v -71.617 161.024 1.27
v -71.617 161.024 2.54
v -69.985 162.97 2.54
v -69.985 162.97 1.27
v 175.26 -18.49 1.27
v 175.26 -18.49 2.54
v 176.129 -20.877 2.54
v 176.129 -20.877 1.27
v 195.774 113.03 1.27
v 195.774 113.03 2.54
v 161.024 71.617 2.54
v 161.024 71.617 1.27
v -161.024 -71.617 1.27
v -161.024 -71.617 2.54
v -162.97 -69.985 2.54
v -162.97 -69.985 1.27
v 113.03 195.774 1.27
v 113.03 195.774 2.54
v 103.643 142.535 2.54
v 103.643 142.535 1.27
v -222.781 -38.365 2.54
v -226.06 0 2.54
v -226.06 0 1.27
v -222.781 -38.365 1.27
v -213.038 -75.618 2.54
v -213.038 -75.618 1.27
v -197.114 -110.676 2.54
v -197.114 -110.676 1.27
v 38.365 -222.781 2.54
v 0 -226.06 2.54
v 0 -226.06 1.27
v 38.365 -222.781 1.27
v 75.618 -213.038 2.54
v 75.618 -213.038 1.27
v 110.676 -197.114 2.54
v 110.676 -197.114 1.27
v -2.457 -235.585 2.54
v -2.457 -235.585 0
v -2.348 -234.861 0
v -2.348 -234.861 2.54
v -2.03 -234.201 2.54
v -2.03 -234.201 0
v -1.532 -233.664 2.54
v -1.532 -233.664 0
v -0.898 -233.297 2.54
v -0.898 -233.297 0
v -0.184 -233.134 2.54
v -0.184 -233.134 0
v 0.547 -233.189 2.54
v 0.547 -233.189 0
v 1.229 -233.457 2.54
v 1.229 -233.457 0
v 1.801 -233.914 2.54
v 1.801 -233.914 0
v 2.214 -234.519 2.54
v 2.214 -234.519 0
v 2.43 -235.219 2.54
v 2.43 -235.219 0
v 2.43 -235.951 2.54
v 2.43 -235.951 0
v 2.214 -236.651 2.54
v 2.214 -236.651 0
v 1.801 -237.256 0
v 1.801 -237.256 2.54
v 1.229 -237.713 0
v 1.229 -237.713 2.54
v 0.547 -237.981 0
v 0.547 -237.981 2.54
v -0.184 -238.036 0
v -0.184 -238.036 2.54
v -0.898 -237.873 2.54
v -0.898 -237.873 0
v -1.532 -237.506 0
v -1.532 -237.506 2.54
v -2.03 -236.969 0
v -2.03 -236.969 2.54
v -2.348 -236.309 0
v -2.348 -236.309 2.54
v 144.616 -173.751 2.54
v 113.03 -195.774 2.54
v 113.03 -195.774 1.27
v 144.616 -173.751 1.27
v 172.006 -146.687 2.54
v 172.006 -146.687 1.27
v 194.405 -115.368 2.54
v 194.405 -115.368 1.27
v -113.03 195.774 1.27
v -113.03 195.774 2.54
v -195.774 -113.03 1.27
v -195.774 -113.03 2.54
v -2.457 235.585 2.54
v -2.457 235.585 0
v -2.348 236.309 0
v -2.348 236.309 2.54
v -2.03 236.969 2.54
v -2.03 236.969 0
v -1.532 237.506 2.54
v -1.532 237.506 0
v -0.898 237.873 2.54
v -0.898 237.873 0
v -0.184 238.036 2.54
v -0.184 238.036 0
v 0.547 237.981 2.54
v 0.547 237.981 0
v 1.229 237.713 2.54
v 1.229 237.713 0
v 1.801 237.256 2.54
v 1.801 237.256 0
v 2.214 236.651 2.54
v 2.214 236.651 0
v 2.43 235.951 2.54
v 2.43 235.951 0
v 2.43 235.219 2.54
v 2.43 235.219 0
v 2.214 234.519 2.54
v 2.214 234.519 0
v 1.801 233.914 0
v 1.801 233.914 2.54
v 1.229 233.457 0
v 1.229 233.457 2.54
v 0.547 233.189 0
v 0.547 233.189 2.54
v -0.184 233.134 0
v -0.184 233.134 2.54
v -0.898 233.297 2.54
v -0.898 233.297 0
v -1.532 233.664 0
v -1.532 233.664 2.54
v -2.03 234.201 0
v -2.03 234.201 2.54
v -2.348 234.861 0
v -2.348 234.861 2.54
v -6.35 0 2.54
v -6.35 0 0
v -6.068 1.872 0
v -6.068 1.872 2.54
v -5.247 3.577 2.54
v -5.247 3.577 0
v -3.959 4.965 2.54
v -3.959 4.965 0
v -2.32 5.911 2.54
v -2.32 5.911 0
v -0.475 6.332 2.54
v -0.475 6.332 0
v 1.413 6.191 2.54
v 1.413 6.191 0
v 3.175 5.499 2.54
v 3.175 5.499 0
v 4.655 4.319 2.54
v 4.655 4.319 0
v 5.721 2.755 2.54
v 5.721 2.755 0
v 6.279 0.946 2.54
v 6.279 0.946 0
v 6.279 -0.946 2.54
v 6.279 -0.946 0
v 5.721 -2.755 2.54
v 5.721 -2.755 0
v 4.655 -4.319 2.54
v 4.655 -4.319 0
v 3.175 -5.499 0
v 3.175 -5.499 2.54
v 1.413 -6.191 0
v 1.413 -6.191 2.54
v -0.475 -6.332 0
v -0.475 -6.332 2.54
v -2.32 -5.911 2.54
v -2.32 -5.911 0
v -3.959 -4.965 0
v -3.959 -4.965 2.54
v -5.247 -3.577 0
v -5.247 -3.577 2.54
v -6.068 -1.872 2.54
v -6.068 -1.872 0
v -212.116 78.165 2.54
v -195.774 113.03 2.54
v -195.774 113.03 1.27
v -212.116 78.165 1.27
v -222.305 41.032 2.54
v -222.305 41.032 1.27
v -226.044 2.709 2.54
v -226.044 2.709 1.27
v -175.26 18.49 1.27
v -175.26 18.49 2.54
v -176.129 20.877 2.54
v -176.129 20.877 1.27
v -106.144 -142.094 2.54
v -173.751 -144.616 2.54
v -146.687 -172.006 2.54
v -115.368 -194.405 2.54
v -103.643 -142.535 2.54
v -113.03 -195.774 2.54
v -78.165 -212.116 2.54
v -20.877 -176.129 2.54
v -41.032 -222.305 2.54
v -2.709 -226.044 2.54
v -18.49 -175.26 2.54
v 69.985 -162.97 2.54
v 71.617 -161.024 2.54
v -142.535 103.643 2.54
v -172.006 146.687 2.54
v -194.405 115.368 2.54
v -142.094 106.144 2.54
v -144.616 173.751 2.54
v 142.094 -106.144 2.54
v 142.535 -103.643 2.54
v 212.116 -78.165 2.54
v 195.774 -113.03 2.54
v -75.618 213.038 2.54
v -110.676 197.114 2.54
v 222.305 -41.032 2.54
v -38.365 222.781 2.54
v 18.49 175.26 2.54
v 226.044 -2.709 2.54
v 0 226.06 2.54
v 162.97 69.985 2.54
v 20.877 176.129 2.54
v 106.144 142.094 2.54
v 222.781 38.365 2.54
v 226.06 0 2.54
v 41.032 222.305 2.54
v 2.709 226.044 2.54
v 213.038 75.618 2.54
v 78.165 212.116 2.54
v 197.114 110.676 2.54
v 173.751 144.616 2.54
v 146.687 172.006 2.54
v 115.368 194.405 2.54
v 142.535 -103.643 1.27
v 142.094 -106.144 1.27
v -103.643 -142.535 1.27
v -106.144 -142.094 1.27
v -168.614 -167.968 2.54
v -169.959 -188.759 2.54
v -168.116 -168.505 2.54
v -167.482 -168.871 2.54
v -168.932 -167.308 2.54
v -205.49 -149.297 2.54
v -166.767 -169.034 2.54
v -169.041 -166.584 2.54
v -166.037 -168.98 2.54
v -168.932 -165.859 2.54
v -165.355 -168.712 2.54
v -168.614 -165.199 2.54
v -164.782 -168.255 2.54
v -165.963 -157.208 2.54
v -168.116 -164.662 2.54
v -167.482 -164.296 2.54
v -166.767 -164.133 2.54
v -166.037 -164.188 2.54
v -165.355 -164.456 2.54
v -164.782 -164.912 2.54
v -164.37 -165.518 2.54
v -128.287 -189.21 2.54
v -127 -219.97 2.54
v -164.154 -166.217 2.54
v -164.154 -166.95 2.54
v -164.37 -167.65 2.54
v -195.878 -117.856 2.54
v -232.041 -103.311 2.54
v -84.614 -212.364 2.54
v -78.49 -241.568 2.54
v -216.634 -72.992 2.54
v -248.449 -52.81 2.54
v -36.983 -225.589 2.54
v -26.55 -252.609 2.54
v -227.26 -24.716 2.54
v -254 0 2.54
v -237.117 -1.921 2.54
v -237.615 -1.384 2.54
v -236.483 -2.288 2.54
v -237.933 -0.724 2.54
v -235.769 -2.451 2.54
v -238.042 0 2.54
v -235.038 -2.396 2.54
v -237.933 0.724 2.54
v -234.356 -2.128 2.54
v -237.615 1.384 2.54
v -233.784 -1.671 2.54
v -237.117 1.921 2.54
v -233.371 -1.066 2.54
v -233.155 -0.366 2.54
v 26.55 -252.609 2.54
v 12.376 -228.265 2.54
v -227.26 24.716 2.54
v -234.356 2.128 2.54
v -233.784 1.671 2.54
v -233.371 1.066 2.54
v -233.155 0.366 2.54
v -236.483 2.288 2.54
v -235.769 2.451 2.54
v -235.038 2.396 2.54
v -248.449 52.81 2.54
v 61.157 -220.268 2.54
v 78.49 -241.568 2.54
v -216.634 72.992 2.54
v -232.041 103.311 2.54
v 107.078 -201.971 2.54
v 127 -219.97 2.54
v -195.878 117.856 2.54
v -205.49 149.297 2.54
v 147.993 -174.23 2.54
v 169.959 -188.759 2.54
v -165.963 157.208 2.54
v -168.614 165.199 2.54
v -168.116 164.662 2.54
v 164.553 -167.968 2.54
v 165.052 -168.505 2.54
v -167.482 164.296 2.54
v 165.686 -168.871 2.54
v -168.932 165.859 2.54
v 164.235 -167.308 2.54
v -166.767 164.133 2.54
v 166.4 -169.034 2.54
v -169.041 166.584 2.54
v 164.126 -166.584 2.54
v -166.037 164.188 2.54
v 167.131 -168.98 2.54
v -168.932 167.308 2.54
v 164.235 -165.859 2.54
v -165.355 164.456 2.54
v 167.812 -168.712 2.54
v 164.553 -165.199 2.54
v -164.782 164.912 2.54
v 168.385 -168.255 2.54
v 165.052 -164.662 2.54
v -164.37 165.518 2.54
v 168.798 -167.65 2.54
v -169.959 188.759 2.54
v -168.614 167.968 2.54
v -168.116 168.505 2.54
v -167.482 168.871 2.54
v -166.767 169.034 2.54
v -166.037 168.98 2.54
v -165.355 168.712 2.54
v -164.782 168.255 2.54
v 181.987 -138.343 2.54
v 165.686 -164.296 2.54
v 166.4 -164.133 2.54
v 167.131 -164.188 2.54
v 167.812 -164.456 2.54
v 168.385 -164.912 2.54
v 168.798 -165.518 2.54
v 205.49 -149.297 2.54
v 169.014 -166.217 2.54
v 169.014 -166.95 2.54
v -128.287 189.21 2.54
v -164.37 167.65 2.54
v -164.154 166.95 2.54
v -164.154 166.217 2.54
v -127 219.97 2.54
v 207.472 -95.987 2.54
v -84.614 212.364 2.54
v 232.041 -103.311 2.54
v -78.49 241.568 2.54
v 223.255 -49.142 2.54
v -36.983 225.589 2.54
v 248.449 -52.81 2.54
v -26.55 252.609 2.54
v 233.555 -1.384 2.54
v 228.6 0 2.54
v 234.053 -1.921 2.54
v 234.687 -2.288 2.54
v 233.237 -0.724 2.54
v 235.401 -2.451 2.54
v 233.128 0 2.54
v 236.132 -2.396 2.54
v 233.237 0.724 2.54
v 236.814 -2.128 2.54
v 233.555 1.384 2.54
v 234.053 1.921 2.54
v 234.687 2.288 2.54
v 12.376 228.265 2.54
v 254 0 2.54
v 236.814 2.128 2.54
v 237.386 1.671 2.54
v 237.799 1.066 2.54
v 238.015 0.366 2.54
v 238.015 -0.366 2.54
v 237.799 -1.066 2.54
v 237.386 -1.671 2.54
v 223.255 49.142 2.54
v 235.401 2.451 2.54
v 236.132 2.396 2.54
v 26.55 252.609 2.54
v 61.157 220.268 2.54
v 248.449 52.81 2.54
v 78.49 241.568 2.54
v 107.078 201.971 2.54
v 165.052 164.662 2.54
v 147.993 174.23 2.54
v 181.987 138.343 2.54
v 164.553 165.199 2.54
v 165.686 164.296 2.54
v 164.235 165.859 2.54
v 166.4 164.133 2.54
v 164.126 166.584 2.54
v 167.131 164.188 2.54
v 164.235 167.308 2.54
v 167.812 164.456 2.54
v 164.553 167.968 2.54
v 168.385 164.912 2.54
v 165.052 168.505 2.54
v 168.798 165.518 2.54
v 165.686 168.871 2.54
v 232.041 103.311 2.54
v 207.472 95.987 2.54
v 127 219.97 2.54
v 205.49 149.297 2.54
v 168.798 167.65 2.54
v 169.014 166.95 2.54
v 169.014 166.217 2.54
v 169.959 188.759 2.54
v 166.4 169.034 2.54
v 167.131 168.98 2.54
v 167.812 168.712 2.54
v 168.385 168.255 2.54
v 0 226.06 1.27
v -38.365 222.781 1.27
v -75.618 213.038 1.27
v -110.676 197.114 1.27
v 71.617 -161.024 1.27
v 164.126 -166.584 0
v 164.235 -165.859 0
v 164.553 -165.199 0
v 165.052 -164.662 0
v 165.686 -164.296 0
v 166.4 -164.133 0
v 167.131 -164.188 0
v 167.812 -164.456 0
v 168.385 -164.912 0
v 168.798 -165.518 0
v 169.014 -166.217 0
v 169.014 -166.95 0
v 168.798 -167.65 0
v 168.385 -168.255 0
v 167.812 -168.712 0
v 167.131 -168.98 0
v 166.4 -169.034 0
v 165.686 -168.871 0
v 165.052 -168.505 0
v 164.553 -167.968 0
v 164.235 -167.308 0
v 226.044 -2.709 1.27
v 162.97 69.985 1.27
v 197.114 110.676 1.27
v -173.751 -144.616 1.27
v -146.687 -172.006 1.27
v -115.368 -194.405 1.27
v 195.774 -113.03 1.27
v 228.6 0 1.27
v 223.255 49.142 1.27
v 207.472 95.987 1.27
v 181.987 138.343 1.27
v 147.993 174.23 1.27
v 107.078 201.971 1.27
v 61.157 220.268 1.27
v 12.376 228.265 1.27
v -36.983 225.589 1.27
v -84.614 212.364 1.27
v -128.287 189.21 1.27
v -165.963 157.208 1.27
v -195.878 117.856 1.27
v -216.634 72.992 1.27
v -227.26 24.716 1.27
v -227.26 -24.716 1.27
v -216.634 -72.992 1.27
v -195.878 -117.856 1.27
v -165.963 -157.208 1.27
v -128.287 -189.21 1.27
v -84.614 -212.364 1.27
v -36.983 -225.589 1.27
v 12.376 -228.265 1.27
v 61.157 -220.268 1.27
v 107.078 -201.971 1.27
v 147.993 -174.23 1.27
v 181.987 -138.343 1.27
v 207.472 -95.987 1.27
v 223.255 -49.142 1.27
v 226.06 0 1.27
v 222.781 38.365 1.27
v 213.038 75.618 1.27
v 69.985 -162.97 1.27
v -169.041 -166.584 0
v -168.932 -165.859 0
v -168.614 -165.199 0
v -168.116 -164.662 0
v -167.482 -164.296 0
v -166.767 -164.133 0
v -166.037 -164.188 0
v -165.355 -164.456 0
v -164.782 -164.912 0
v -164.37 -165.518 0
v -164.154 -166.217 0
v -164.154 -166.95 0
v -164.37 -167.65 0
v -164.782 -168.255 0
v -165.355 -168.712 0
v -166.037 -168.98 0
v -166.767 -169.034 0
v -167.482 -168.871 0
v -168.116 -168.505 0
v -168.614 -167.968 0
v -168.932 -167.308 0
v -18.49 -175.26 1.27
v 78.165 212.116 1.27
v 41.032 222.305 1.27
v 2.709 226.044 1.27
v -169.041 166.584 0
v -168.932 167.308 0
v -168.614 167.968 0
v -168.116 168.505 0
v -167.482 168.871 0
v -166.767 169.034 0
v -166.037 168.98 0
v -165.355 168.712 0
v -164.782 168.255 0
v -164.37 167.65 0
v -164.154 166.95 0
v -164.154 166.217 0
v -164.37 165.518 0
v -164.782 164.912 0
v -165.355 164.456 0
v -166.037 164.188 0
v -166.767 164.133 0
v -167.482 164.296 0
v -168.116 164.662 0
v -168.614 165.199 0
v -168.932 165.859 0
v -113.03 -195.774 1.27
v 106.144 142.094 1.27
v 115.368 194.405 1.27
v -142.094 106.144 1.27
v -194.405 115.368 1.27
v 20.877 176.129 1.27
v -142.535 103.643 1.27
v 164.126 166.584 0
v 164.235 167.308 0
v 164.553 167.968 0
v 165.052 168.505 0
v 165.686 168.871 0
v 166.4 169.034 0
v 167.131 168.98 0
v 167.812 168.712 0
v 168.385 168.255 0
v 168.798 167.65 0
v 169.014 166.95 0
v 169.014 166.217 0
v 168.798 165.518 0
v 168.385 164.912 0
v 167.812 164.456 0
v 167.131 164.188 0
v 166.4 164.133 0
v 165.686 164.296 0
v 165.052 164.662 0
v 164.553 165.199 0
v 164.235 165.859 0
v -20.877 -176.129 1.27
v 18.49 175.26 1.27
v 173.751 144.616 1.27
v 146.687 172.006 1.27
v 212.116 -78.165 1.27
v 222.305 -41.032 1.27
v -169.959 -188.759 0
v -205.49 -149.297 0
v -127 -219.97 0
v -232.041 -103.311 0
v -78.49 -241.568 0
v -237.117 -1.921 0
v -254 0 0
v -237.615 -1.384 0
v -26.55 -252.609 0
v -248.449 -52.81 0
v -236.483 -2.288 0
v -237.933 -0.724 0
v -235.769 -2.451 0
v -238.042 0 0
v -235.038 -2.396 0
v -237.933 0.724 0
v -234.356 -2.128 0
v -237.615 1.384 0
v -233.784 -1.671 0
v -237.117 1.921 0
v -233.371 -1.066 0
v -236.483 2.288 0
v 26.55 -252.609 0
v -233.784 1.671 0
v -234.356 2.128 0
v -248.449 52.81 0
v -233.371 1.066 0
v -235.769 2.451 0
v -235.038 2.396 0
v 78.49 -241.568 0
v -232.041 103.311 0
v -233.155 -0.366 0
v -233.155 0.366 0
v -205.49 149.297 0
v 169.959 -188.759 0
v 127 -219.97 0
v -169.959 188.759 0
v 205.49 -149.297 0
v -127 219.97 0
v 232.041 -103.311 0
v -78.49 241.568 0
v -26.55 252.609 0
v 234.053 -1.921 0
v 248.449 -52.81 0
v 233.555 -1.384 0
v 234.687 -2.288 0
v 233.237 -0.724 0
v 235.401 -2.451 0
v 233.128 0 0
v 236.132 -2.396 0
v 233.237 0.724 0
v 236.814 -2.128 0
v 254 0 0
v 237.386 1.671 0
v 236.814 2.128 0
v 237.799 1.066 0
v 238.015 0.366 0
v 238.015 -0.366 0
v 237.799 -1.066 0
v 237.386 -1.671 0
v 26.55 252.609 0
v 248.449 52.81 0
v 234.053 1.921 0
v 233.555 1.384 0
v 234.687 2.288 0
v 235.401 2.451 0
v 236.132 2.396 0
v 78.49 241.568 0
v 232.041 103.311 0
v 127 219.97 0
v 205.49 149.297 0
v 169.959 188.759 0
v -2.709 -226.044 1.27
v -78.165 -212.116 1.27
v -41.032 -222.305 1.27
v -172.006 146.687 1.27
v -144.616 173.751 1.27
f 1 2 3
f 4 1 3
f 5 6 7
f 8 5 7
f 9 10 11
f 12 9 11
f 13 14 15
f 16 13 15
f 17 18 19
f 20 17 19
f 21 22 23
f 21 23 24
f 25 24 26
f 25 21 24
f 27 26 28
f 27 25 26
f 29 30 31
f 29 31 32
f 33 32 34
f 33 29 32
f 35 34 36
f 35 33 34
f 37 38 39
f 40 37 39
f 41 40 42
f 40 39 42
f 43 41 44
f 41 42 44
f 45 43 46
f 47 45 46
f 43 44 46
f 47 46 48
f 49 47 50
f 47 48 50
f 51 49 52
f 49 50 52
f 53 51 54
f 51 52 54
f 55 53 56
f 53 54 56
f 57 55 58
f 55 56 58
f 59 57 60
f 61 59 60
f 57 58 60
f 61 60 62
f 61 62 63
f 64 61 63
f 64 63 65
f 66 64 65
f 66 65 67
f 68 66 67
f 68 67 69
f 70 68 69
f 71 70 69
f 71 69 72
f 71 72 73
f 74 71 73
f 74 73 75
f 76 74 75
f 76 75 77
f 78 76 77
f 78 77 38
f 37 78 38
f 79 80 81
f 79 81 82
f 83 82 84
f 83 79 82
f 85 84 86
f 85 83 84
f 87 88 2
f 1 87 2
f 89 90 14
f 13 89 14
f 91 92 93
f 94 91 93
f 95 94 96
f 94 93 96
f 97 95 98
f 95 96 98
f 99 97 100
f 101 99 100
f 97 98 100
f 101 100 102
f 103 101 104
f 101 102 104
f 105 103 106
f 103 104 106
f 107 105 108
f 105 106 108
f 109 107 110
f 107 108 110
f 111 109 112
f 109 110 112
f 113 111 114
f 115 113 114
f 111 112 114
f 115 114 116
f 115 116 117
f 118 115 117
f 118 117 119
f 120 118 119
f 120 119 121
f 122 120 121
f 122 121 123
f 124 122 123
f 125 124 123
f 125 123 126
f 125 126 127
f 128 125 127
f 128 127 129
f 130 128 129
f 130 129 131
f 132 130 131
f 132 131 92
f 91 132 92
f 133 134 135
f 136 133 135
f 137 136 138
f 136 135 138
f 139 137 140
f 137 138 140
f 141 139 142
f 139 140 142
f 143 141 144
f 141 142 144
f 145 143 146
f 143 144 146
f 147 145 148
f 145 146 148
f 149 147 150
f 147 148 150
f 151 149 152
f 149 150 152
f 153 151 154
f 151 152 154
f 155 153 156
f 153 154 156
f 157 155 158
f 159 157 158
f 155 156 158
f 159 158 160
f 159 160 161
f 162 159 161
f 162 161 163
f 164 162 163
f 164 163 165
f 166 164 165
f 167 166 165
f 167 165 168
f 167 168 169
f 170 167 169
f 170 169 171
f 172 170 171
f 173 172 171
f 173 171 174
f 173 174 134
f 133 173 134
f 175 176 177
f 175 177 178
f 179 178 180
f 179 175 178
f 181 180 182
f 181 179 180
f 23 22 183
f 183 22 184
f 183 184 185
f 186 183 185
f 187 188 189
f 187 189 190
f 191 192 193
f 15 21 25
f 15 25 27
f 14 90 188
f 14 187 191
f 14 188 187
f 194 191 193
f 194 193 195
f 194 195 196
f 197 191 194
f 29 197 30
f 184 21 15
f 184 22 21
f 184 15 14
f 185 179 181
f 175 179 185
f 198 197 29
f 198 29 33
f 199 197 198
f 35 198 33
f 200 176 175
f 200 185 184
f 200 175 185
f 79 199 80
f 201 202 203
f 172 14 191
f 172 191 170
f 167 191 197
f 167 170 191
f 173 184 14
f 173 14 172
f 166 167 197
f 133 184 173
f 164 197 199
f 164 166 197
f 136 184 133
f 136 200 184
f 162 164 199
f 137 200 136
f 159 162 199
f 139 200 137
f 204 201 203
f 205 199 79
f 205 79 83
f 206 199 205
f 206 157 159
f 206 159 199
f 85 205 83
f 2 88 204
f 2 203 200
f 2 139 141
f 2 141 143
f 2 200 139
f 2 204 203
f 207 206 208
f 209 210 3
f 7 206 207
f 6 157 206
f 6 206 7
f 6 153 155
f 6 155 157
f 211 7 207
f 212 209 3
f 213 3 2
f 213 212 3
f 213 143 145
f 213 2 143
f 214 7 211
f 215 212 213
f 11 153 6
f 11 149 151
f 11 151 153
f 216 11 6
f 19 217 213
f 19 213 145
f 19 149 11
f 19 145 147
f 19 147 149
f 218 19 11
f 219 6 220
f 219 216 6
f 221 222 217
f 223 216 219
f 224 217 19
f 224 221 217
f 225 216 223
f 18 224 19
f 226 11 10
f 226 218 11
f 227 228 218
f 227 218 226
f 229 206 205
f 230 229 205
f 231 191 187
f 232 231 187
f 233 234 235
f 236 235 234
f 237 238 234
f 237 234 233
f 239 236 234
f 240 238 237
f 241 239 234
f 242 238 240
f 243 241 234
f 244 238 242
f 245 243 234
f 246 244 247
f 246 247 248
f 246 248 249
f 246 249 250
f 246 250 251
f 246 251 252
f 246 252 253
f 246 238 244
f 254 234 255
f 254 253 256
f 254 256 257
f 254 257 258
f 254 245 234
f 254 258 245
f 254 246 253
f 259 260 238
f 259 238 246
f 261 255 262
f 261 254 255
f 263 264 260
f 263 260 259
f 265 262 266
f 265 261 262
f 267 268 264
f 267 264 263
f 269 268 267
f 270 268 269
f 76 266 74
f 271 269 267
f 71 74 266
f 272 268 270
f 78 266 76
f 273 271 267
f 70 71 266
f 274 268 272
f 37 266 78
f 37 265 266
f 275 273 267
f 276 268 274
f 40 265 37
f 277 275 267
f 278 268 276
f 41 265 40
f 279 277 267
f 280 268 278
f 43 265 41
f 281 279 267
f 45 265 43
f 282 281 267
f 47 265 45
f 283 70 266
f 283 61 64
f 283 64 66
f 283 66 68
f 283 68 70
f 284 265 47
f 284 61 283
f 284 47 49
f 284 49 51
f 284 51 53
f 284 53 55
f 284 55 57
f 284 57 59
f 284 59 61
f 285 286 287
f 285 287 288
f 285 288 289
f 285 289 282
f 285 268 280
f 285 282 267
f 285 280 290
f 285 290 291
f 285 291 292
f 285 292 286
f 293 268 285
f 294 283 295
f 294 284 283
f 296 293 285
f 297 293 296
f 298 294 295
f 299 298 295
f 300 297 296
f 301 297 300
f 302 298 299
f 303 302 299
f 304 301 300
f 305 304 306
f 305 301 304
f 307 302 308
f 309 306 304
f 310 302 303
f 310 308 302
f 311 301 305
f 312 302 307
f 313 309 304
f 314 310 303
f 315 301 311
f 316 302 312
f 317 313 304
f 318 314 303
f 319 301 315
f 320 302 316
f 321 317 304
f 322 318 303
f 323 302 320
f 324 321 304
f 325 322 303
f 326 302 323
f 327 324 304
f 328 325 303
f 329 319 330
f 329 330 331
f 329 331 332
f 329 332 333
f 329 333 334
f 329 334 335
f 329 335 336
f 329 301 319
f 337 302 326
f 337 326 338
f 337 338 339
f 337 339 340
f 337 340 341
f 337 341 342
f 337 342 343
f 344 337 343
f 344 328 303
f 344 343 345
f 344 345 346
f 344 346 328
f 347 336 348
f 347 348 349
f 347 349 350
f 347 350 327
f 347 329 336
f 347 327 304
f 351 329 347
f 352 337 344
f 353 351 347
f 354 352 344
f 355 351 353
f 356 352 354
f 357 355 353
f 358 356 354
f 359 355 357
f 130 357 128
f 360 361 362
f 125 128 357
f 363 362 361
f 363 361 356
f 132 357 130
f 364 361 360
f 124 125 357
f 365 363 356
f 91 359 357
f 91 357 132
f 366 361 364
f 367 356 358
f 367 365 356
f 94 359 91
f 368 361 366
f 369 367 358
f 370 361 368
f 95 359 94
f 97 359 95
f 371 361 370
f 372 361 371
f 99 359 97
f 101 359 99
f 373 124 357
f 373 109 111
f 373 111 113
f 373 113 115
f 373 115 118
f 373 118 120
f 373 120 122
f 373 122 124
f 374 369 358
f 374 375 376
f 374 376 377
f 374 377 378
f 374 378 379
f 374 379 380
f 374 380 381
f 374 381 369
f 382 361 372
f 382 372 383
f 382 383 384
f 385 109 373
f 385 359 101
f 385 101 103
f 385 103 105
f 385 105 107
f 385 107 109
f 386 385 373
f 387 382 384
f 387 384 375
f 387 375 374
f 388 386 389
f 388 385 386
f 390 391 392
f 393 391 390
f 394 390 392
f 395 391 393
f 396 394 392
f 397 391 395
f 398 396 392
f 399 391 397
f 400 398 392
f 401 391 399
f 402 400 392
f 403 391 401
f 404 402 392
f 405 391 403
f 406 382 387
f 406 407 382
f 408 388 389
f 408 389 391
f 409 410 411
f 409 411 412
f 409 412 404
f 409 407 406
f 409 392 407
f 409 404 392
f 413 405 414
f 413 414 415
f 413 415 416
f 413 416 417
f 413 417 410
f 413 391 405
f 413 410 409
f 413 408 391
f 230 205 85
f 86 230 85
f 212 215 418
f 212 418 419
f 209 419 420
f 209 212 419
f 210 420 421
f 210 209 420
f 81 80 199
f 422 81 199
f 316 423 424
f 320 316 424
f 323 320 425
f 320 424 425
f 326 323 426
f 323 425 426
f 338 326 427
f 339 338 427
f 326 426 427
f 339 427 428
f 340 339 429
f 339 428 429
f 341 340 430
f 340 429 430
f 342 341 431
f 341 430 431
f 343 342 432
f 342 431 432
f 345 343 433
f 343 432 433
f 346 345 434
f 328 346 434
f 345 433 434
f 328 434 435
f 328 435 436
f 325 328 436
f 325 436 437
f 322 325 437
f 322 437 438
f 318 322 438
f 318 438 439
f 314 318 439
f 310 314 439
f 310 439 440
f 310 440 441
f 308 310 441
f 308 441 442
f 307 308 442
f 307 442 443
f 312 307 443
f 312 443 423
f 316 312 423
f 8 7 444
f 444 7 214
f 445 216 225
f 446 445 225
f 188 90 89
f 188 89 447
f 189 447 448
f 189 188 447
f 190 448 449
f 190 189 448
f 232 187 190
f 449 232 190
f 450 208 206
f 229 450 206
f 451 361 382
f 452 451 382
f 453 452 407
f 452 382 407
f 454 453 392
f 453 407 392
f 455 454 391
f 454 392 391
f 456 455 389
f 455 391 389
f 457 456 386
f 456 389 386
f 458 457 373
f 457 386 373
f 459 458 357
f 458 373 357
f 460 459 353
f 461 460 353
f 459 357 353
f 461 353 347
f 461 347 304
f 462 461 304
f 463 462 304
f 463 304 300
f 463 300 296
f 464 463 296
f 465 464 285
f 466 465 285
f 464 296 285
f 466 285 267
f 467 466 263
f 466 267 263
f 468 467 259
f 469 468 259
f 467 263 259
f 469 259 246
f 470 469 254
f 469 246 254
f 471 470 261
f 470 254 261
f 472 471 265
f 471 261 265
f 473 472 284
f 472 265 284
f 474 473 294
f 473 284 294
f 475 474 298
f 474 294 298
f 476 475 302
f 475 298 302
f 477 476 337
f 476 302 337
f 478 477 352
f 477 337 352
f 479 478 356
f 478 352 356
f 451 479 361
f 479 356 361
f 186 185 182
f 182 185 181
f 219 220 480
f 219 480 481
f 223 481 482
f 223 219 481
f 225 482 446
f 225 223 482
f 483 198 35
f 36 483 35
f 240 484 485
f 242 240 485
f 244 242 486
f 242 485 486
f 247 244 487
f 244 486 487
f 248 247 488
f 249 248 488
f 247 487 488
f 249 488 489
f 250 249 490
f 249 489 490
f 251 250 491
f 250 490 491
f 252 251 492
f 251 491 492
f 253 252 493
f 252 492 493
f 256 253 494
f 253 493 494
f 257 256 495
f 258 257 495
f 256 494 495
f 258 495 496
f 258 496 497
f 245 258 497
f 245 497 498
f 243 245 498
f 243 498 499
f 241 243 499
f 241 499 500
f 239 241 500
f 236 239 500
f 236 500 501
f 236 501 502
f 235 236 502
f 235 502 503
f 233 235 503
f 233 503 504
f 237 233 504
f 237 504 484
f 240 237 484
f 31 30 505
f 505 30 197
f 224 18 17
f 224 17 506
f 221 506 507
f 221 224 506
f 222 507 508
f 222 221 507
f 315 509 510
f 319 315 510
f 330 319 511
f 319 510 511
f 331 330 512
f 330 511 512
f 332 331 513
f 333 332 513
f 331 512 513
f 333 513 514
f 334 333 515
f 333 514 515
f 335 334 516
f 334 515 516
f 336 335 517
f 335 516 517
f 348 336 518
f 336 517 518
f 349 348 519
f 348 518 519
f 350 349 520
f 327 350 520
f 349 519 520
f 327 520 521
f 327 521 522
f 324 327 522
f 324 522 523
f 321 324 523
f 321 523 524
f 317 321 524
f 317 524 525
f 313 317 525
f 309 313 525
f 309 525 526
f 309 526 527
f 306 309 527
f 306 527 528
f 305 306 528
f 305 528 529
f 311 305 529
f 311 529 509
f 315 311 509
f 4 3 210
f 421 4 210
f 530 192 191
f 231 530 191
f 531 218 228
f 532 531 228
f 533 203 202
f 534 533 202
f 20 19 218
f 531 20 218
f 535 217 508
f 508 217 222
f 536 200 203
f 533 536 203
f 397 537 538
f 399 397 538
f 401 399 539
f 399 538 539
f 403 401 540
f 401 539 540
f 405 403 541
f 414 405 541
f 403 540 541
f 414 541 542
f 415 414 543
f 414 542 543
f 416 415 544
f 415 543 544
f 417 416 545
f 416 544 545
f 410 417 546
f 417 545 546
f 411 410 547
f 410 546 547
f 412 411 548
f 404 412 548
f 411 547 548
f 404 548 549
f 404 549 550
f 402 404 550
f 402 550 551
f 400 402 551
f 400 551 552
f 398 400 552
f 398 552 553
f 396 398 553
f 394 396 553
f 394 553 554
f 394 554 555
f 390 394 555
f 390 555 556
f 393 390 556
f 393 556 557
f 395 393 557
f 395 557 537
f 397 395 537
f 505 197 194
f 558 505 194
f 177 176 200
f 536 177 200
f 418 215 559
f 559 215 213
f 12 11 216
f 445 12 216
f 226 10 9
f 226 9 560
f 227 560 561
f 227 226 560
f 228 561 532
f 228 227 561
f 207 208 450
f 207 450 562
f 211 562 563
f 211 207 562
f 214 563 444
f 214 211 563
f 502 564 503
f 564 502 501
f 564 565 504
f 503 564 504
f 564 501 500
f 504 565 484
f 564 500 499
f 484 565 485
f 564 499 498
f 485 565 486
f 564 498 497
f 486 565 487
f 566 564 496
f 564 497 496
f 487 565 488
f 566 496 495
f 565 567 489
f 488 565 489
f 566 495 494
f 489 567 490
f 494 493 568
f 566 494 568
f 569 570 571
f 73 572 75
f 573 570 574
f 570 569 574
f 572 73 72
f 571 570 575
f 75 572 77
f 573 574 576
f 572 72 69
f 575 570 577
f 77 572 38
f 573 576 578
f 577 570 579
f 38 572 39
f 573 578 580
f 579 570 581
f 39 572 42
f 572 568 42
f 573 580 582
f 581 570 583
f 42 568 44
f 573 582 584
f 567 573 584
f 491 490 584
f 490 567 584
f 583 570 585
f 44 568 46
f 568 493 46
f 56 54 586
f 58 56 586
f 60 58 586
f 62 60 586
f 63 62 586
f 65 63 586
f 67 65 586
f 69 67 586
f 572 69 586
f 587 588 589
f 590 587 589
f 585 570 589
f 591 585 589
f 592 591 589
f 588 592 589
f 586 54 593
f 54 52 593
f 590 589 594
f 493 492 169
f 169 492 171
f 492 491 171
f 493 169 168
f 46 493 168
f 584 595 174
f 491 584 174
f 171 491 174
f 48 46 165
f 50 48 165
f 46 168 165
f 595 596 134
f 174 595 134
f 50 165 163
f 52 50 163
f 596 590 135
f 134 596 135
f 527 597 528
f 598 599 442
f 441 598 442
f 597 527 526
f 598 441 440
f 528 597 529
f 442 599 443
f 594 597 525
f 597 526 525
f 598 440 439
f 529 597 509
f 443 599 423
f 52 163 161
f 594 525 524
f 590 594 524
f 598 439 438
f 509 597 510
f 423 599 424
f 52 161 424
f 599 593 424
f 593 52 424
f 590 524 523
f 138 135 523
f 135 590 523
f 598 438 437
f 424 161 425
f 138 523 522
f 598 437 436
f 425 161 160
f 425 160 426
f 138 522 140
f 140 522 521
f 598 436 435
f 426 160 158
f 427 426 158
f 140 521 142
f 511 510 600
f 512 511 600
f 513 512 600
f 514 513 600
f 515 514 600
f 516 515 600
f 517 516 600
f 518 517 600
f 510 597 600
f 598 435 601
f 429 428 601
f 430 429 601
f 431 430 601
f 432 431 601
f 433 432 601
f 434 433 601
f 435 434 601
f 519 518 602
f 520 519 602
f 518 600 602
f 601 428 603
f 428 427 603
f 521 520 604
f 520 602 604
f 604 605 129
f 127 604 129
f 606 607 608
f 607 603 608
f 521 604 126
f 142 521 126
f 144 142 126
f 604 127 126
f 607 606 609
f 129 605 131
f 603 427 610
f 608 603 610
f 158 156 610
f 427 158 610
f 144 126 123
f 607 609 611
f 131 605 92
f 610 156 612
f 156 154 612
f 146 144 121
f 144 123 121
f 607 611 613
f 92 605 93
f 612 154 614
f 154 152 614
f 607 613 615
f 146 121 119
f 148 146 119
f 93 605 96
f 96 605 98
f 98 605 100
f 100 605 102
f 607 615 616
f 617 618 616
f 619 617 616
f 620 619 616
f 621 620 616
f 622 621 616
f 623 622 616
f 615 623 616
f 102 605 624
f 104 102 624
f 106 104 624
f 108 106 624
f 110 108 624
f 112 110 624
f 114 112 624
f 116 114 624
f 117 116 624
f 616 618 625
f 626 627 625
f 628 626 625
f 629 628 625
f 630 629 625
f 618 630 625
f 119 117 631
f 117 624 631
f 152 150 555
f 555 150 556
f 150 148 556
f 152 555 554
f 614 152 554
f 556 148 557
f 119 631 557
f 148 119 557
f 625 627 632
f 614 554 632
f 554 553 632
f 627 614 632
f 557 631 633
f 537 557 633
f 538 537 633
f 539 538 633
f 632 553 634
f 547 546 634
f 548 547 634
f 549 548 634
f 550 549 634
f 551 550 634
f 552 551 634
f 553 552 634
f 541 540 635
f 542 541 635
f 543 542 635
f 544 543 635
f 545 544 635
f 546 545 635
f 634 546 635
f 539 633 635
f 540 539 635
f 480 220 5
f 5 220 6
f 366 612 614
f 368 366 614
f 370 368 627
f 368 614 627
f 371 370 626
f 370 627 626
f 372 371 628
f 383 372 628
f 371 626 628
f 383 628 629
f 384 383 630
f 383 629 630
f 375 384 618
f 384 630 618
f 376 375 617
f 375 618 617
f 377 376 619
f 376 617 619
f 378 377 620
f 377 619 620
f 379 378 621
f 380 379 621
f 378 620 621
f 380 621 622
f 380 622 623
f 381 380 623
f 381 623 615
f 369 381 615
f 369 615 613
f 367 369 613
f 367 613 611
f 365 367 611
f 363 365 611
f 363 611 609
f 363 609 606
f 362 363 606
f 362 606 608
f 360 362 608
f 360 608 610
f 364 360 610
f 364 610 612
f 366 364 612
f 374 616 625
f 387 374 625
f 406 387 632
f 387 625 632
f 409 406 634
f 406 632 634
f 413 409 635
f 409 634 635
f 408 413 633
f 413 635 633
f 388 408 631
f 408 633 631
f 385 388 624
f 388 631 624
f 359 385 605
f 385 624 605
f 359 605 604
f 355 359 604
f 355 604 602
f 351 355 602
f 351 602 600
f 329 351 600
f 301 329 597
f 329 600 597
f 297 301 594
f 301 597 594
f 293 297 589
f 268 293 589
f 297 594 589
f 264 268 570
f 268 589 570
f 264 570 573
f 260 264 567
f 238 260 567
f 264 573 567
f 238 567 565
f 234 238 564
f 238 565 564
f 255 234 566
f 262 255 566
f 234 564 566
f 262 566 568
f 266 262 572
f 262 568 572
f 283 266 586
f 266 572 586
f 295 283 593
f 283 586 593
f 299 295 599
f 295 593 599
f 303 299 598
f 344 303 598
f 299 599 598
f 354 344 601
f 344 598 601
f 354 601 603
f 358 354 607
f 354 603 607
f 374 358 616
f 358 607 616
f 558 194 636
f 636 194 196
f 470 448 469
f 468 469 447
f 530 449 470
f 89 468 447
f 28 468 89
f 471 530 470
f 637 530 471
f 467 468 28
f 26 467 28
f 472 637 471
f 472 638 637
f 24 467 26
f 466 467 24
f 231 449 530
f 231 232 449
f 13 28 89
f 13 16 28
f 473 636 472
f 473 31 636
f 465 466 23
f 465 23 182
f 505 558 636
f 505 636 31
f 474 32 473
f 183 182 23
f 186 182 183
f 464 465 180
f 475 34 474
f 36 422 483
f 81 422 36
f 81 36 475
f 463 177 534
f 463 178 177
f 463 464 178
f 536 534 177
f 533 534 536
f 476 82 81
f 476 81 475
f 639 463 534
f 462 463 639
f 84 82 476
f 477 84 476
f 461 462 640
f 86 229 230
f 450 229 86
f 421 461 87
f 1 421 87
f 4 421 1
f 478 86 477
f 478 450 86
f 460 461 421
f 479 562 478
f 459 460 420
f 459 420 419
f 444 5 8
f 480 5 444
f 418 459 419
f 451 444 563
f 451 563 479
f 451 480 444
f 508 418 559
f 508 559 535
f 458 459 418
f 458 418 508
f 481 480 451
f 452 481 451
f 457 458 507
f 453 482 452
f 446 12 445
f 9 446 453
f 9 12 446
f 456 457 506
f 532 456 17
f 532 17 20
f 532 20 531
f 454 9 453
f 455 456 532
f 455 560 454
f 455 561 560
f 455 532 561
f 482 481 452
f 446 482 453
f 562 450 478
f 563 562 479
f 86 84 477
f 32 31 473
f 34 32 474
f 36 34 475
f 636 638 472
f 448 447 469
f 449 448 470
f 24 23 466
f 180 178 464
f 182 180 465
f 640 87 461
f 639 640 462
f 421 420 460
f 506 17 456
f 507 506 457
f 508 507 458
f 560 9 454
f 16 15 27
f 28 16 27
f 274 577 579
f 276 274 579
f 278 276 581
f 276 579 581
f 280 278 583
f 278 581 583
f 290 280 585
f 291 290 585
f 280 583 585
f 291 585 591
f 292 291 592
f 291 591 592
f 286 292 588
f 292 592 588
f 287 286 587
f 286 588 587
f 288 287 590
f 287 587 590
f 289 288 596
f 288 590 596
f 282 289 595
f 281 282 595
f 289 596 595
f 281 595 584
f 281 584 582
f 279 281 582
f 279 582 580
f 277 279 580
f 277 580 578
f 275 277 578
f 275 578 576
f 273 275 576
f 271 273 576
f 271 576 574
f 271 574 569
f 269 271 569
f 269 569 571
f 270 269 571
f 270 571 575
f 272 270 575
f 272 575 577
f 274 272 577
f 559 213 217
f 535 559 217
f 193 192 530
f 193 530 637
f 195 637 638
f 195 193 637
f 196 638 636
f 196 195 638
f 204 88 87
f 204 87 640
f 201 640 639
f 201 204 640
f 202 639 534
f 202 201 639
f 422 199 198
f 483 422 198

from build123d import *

# Parameters (mm, degrees)
SKETCH1_R                    = 254
BOSS_EXTRUDE1_DEPTH          = 2.54
SKETCH2_R                    = 228.6
SKETCH2_R_2                  = 226.06
CUT_EXTRUDE1_DEPTH           = 1.27
CUT_EXTRUDE2_DEPTH           = 1.27
SKETCH8_R                    = 6.35
CUT_EXTRUDE3_DEPTH           = 360.219224987
F_10_0_1935_DIAMETER_HOLE1_D = 4.9149


with BuildPart() as part:
    # Sketch1 → Boss-Extrude1 (new body)
    with BuildSketch(Plane.XY):
        Circle(SKETCH1_R)
    extrude(amount=BOSS_EXTRUDE1_DEPTH)

    # Sketch2 → Cut-Extrude1 (cut)
    with BuildSketch(Plane.XY.offset(2.54)):
        Circle(SKETCH2_R)
        Circle(SKETCH2_R_2, mode=Mode.SUBTRACT)
    extrude(amount=-CUT_EXTRUDE1_DEPTH, mode=Mode.SUBTRACT)

    # Sketch4 → Cut-Extrude2 (cut)
    with BuildSketch(Plane.XY.offset(2.54)):
        with BuildLine():
            Line((-226.06, 0), (-175.26, 18.489687901))
            Line((-175.26, 18.489687901), (-176.128731164, 20.876507158))
            Line((-176.128731164, 20.876507158), (-226.043768674, 2.708919262))
            ThreePointArc((-226.043768674, 2.708919262), (-226.055942132, 1.354483944), (-226.06, 0))
        make_face()
        with BuildLine():
            Line((-195.77370278, 113.03), (-142.534768317, 103.64253943))
            Line((-142.534768317, 103.64253943), (-142.093701946, 106.143951123))
            Line((-142.093701946, 106.143951123), (-194.405186408, 115.367877234))
            ThreePointArc((-194.405186408, 115.367877234), (-195.092946591, 114.200988571), (-195.77370278, 113.03))
        make_face()
        with BuildLine():
            Line((-113.03, 195.77370278), (-71.61746057, 161.024456218))
            Line((-71.61746057, 161.024456218), (-69.984780041, 162.970209103))
            Line((-69.984780041, 162.970209103), (-110.67589144, 197.11410567))
            ThreePointArc((-110.67589144, 197.11410567), (-111.854953561, 196.447430535), (-113.03, 195.77370278))
        make_face()
        with BuildLine():
            Line((0, 226.06), (18.489687901, 175.26))
            Line((18.489687901, 175.26), (20.876507158, 176.128731164))
            Line((20.876507158, 176.128731164), (2.708919262, 226.043768674))
            ThreePointArc((2.708919262, 226.043768674), (1.354483944, 226.055942132), (0, 226.06))
        make_face()
        with BuildLine():
            Line((113.03, 195.77370278), (103.64253943, 142.534768317))
            Line((103.64253943, 142.534768317), (106.143951123, 142.093701946))
            Line((106.143951123, 142.093701946), (115.367877234, 194.405186408))
            ThreePointArc((115.367877234, 194.405186408), (114.200988571, 195.092946591), (113.03, 195.77370278))
        make_face()
        with BuildLine():
            Line((195.77370278, 113.03), (161.024456218, 71.61746057))
            Line((161.024456218, 71.61746057), (162.970209103, 69.984780041))
            Line((162.970209103, 69.984780041), (197.11410567, 110.67589144))
            ThreePointArc((197.11410567, 110.67589144), (196.447430535, 111.854953561), (195.77370278, 113.03))
        make_face()
        with BuildLine():
            Line((226.06, 0), (175.26, -18.489687901))
            Line((175.26, -18.489687901), (176.128731164, -20.876507158))
            Line((176.128731164, -20.876507158), (226.043768674, -2.708919262))
            ThreePointArc((226.043768674, -2.708919262), (226.055942132, -1.354483944), (226.06, 0))
        make_face()
        with BuildLine():
            Line((195.77370278, -113.03), (142.534768317, -103.64253943))
            Line((142.534768317, -103.64253943), (142.093701946, -106.143951123))
            Line((142.093701946, -106.143951123), (194.405186408, -115.367877234))
            ThreePointArc((194.405186408, -115.367877234), (195.092946591, -114.200988571), (195.77370278, -113.03))
        make_face()
        with BuildLine():
            Line((113.03, -195.77370278), (71.61746057, -161.024456218))
            Line((71.61746057, -161.024456218), (69.984780041, -162.970209103))
            Line((69.984780041, -162.970209103), (110.67589144, -197.11410567))
            ThreePointArc((110.67589144, -197.11410567), (111.854953561, -196.447430535), (113.03, -195.77370278))
        make_face()
        with BuildLine():
            Line((0, -226.06), (-18.489687901, -175.26))
            Line((-18.489687901, -175.26), (-20.876507158, -176.128731164))
            Line((-20.876507158, -176.128731164), (-2.708919262, -226.043768674))
            ThreePointArc((-2.708919262, -226.043768674), (-1.354483944, -226.055942132), (0, -226.06))
        make_face()
        with BuildLine():
            Line((-113.03, -195.77370278), (-103.64253943, -142.534768317))
            Line((-103.64253943, -142.534768317), (-106.143951123, -142.093701946))
            Line((-106.143951123, -142.093701946), (-115.367877234, -194.405186408))
            ThreePointArc((-115.367877234, -194.405186408), (-114.200988571, -195.092946591), (-113.03, -195.77370278))
        make_face()
        with BuildLine():
            Line((-195.77370278, -113.03), (-161.024456218, -71.61746057))
            Line((-161.024456218, -71.61746057), (-162.970209103, -69.984780041))
            Line((-162.970209103, -69.984780041), (-197.11410567, -110.67589144))
            ThreePointArc((-197.11410567, -110.67589144), (-196.447430535, -111.854953561), (-195.77370278, -113.03))
        make_face()
    extrude(amount=-CUT_EXTRUDE2_DEPTH, mode=Mode.SUBTRACT)

    # Sketch8 → Cut-Extrude3 (cut, through all)
    with BuildSketch(Plane(origin=(0, 0, 0), x_dir=(-1, 0, 0), z_dir=(0, 0, -1))):
        Circle(SKETCH8_R)
    extrude(amount=-CUT_EXTRUDE3_DEPTH, mode=Mode.SUBTRACT)

    # #10 (0.1935) Diameter Hole1 (through all)
    with Locations(Plane.XY.offset(2.54)):
        with Locations((-235.585, 0), (-166.583751046, 166.583751046), (0, 235.585), (166.583751046, 166.583751046), (235.585, 0), (166.583751046, -166.583751046), (0, -235.585), (-166.583751046, -166.583751046)):
            Hole(F_10_0_1935_DIAMETER_HOLE1_D / 2)


solid = part.part
